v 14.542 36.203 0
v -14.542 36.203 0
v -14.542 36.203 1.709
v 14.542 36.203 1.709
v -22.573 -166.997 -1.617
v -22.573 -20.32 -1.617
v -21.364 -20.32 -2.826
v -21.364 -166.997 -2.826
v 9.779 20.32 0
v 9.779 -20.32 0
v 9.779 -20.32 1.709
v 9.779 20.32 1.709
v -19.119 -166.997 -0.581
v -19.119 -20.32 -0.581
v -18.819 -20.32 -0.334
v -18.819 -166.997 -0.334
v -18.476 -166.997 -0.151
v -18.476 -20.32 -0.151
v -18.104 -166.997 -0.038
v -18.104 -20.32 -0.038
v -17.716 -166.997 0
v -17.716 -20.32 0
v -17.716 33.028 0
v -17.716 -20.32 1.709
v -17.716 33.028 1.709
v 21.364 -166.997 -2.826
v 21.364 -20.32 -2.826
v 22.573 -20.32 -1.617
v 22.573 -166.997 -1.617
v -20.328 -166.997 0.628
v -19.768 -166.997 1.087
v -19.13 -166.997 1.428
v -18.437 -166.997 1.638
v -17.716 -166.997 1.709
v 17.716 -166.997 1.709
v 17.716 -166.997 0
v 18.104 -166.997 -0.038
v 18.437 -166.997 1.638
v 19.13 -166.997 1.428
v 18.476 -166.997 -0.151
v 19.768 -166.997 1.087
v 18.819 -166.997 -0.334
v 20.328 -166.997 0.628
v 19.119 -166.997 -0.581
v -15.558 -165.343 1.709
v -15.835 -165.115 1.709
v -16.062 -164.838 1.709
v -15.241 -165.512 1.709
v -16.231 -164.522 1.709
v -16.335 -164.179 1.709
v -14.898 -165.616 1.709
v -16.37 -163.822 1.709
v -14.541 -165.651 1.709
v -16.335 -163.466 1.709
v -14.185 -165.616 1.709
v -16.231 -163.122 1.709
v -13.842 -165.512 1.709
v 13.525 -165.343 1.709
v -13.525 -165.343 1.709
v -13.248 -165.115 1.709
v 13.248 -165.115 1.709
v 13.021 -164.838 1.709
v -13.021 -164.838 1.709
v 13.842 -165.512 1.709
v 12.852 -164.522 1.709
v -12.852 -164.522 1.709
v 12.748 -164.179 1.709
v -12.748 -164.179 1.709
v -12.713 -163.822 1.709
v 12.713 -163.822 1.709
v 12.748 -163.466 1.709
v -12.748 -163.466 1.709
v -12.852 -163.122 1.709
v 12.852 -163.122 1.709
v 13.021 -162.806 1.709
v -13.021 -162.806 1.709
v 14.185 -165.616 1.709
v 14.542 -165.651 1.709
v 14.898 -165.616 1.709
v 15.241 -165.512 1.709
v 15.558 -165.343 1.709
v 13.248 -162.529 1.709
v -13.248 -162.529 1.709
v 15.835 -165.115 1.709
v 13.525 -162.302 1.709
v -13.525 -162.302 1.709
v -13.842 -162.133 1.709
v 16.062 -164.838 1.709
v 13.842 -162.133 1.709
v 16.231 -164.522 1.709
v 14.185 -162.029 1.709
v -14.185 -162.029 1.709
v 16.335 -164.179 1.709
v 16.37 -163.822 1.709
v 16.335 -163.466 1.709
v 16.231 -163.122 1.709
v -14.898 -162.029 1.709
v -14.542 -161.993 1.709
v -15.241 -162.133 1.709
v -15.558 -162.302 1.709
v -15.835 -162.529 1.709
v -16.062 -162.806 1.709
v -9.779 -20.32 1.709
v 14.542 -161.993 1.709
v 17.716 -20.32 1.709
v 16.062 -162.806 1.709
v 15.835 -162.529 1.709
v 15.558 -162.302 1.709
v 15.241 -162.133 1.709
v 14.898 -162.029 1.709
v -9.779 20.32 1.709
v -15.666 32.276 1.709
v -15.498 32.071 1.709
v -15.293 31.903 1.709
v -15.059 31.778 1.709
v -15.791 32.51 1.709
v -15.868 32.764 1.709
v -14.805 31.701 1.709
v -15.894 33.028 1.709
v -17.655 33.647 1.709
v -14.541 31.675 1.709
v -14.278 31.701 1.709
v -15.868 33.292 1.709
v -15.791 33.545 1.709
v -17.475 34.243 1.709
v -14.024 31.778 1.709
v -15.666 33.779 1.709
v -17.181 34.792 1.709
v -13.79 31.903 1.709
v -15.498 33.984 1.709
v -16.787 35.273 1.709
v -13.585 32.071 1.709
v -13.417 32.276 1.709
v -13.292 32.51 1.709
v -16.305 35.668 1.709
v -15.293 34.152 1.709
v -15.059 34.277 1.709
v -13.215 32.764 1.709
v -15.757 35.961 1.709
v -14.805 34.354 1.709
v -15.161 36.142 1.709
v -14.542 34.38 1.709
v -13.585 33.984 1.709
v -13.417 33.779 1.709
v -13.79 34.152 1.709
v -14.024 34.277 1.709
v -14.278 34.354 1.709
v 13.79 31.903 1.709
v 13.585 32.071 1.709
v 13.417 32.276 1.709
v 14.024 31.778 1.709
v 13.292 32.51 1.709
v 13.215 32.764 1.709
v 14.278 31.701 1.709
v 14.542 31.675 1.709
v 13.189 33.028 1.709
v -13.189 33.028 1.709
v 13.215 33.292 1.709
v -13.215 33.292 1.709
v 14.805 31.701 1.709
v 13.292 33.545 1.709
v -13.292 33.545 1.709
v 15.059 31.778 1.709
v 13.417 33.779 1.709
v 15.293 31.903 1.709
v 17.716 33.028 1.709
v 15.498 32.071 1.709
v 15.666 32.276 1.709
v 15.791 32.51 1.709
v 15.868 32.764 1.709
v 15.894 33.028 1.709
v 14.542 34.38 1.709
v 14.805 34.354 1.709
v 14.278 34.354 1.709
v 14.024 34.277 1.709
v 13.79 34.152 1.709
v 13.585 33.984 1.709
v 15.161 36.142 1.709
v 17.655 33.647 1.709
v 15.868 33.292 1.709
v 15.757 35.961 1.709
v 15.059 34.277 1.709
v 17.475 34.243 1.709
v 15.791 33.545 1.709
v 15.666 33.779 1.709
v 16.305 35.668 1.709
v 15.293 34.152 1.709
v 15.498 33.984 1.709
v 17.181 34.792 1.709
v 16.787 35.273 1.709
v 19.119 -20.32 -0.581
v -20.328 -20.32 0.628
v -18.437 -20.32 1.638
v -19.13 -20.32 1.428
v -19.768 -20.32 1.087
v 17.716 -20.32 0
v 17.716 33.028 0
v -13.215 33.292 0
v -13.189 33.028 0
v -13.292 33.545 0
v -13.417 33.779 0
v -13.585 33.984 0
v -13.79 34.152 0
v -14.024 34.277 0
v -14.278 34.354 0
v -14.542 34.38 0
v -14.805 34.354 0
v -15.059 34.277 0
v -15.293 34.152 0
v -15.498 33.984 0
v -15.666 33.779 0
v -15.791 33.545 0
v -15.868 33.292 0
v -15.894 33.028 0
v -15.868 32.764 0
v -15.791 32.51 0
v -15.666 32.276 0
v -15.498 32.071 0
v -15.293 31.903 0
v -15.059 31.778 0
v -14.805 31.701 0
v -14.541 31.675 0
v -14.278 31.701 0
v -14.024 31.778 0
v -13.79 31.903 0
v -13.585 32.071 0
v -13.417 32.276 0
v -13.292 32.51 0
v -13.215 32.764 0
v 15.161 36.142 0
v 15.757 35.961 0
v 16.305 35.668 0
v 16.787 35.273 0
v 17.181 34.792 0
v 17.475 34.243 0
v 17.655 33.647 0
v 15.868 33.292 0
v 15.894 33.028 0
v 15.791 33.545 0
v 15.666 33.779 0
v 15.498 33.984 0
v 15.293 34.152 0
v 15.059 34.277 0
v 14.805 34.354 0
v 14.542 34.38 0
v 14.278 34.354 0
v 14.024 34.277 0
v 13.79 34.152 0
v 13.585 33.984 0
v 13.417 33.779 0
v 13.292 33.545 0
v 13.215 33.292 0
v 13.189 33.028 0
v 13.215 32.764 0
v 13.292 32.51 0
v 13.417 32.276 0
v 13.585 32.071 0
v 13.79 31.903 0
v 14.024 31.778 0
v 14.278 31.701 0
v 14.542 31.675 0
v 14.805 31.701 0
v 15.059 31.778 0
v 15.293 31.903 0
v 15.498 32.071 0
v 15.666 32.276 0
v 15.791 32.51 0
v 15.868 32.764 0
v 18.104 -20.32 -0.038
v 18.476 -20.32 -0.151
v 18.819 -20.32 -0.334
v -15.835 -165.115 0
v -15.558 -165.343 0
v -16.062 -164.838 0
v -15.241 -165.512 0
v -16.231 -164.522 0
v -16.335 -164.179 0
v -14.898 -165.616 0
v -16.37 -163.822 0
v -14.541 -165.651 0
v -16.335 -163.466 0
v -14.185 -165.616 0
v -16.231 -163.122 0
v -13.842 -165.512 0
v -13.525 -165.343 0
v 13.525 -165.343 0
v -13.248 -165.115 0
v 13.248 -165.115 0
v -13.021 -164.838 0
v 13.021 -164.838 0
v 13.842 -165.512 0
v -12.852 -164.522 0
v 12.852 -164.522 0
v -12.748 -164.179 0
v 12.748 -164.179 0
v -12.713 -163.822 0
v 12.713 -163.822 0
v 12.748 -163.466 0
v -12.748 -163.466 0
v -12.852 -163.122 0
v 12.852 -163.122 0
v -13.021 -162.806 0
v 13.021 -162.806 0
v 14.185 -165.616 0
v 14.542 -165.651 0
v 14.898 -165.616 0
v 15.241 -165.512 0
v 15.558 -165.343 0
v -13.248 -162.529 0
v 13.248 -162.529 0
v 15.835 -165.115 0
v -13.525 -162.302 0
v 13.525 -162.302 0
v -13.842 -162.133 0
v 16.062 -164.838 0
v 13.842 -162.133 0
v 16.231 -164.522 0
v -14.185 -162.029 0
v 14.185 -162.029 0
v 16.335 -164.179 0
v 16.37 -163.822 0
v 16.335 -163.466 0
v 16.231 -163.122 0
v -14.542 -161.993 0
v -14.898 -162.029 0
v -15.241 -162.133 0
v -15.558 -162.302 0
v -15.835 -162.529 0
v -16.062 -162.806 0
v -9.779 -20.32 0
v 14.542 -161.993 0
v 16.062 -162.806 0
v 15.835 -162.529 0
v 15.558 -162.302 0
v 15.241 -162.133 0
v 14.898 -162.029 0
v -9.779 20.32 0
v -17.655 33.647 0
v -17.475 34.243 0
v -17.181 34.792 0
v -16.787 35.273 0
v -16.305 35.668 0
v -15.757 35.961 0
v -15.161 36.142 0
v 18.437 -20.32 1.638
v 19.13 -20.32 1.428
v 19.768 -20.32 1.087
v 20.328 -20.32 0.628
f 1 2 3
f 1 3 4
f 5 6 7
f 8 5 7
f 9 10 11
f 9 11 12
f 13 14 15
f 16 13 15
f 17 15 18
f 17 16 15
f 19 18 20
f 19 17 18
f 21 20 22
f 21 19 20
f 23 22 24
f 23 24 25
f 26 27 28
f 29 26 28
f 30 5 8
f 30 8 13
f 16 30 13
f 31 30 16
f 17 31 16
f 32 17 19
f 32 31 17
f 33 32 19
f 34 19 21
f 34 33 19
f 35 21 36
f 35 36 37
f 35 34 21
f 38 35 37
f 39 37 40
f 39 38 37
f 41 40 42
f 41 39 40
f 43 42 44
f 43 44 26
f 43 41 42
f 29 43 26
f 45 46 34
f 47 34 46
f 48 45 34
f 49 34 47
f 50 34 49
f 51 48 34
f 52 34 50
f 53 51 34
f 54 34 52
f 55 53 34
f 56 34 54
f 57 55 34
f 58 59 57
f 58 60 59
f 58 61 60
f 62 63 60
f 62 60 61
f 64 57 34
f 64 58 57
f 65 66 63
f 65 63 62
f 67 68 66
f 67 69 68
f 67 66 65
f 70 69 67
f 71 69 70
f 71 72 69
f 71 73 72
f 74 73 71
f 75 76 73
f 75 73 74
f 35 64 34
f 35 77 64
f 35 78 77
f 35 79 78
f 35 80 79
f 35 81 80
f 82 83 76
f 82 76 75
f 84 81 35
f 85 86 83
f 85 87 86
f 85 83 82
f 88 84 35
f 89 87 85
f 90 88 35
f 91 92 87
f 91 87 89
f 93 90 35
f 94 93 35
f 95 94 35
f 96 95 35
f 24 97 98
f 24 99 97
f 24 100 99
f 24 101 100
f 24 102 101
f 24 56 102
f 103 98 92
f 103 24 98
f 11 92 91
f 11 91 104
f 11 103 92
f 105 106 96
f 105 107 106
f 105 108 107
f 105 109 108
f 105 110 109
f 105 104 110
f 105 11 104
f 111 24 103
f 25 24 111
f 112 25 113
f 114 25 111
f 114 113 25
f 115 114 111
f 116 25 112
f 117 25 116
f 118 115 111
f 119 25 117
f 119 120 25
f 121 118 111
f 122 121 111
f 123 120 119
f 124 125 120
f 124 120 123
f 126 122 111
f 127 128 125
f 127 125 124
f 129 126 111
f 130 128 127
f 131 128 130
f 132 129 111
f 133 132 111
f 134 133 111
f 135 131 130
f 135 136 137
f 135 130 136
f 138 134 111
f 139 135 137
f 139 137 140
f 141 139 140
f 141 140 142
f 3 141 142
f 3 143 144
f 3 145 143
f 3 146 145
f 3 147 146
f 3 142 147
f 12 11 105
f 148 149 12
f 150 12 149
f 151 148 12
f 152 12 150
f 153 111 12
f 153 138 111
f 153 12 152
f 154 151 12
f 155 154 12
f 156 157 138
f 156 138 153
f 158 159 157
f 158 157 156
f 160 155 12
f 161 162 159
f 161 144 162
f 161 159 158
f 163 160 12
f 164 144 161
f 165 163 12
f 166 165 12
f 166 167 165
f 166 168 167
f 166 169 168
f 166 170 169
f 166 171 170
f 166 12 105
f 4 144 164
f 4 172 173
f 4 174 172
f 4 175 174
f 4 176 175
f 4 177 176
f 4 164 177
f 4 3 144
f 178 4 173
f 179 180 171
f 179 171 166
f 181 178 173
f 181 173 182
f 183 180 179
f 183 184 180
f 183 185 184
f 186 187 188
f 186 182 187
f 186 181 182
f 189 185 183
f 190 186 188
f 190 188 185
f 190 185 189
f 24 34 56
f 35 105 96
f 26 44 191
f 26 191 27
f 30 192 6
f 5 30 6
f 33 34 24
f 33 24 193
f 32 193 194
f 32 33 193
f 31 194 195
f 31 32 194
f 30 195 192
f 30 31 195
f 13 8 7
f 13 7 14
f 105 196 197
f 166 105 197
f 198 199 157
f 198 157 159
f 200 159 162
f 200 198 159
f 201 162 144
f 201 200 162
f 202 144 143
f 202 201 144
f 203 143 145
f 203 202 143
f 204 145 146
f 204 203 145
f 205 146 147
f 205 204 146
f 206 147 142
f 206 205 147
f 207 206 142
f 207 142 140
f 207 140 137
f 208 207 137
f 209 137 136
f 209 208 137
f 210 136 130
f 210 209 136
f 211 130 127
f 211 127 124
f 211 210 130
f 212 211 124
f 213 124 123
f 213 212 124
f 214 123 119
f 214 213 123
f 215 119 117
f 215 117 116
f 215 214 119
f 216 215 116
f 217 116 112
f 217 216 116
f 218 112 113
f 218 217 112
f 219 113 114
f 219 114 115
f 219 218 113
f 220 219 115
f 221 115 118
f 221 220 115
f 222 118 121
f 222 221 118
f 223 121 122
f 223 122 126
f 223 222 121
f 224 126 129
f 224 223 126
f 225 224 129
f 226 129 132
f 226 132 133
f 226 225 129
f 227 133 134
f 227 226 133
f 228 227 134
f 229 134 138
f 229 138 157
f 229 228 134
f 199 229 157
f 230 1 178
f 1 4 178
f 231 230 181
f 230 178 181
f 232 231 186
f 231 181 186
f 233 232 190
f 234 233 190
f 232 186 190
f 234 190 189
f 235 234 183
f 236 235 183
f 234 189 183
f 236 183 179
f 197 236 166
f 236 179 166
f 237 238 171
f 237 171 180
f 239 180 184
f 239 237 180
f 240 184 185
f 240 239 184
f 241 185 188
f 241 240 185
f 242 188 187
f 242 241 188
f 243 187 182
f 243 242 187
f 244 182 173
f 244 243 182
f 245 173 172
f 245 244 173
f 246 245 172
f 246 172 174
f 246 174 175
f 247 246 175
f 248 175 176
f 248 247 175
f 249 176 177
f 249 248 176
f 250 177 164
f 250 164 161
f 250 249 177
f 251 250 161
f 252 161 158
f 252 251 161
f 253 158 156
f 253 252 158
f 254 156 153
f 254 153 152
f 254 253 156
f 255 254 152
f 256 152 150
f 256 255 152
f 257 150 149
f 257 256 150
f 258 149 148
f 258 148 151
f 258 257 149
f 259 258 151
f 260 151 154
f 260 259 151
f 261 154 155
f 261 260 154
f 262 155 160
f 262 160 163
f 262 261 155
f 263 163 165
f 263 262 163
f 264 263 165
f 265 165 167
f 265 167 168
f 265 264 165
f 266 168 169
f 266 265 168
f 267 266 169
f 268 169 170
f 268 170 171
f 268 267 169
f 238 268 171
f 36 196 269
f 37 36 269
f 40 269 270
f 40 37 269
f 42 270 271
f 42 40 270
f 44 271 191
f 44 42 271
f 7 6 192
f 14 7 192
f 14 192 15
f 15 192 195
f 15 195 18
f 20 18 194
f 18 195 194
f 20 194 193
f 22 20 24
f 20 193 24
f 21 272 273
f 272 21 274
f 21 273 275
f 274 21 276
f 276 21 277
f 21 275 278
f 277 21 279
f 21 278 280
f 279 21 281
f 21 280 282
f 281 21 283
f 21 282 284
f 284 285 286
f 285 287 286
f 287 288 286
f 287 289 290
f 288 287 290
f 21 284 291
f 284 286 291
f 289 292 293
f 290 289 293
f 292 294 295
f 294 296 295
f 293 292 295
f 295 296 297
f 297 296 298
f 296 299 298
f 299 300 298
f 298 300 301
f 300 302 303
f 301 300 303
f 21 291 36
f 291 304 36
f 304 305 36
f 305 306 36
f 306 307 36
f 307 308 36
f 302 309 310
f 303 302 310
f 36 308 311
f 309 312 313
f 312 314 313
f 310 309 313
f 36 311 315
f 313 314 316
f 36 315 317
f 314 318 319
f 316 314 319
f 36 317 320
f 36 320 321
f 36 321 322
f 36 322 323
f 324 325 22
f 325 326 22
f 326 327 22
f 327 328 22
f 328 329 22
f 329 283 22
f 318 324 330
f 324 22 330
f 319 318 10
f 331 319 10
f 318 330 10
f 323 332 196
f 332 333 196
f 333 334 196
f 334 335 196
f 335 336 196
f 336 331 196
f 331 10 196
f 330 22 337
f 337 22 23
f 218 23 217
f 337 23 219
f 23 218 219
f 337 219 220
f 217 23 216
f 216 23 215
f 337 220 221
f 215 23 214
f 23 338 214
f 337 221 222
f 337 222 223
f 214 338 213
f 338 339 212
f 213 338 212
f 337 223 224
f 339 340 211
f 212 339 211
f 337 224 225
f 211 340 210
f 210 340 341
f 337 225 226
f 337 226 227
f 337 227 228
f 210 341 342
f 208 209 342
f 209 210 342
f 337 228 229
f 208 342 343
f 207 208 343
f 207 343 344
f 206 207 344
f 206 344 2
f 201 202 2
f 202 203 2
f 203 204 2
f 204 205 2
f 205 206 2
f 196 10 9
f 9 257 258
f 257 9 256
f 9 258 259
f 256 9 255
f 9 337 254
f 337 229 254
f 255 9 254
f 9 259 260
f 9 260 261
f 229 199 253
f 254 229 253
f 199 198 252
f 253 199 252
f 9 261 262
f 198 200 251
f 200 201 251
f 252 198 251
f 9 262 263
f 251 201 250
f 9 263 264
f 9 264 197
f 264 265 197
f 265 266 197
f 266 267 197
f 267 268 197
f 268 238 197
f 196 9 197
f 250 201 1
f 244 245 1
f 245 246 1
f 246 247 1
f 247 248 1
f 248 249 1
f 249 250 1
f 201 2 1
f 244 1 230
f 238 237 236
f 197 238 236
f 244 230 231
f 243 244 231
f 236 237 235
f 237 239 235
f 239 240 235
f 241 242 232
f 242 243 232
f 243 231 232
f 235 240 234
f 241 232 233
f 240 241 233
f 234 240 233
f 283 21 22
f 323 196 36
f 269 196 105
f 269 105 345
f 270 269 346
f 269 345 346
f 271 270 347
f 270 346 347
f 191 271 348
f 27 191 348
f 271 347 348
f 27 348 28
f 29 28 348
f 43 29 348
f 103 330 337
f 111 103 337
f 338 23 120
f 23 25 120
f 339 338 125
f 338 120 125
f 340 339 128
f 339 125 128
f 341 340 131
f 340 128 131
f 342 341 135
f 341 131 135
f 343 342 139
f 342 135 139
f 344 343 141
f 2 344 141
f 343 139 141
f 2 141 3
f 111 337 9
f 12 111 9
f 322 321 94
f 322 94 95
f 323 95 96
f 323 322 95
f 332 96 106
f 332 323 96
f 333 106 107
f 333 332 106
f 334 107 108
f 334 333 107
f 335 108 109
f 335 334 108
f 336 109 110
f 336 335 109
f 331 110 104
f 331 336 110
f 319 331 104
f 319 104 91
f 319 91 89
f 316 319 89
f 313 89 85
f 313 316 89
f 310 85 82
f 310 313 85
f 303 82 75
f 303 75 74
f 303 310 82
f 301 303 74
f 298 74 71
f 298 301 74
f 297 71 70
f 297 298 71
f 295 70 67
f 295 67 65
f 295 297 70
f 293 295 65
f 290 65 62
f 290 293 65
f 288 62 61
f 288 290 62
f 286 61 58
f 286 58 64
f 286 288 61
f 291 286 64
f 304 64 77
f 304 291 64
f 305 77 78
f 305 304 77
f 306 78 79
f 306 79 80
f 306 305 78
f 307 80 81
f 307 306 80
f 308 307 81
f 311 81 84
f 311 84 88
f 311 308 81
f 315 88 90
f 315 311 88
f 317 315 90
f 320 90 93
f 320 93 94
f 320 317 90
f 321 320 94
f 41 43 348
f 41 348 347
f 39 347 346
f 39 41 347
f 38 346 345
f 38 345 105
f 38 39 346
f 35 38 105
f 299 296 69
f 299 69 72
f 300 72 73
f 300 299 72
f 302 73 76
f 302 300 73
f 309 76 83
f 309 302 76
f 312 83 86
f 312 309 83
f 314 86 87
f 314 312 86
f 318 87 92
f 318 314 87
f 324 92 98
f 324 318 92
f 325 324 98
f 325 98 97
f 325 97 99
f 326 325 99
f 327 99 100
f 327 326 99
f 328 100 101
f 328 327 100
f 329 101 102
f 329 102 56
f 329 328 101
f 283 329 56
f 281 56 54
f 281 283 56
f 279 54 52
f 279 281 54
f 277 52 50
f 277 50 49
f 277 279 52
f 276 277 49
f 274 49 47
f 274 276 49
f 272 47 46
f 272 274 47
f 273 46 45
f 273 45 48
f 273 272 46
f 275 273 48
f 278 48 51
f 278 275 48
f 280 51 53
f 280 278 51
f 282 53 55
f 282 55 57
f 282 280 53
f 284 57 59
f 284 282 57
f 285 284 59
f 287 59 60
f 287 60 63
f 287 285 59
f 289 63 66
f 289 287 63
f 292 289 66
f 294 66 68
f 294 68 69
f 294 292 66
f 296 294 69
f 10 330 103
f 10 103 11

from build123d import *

# Parameters (mm, degrees)
F0_W     = 35.433
F0_H     = 203.2
F0_R     = 1.8288
F0_R_2   = 1.35255
F0_W_2   = 19.558
F0_H_2   = 40.64
F1_DEPTH = 1.70942
F3_DEPTH = 146.677299
F4_R     = 3.175


with BuildPart() as f1:
    # F0 (on Top) → F1 (new body)
    with BuildSketch(Plane.XY):
        with Locations((0, -65.397299)):
            Rectangle(F0_W, F0_H)
        with Locations((-14.5415, -163.822299)):
            Circle(F0_R, mode=Mode.SUBTRACT)
        with Locations((14.5415, -163.822299)):
            Circle(F0_R, mode=Mode.SUBTRACT)
        with Locations((-14.5415, 33.027701)):
            Circle(F0_R_2, mode=Mode.SUBTRACT)
        Rectangle(F0_W_2, F0_H_2, mode=Mode.SUBTRACT)
        with Locations((14.5415, 33.027701)):
            Circle(F0_R_2, mode=Mode.SUBTRACT)
    extrude(amount=F1_DEPTH)

    # F2 (on face) → F3 (join, through all)
    with BuildSketch(Plane.XZ.offset(166.997299)):
        with BuildLine():
            ThreePointArc((-19.119216, -0.581024), (-18.475644, -0.151003), (-17.7165, 0))
            Line((-17.7165, 0), (-17.7165, 1.70942))
            ThreePointArc((-17.7165, 1.70942), (-19.129811, 1.428295), (-20.327958, 0.627718))
            Line((-20.327958, 0.627718), (-22.573023, -1.617346))
            Line((-22.573023, -1.617346), (-21.36428, -2.826088))
            Line((-21.36428, -2.826088), (-19.119216, -0.581024))
        make_face()
        with BuildLine():
            Line((17.7165, 1.70942), (17.7165, 0))
            ThreePointArc((17.7165, 0), (18.475644, -0.151003), (19.119216, -0.581024))
            Line((19.119216, -0.581024), (21.36428, -2.826088))
            Line((21.36428, -2.826088), (22.573023, -1.617346))
            Line((22.573023, -1.617346), (20.327958, 0.627718))
            ThreePointArc((20.327958, 0.627718), (19.129811, 1.428295), (17.7165, 1.70942))
        make_face()
    extrude(amount=-F3_DEPTH)

    # F4
    f4_edges = [f1.edges().sort_by_distance(p)[0] for p in [
        (17.7165, 36.202701, 0.85471),
        (-17.7165, 36.202701, 0.85471),
    ]]
    fillet(f4_edges, radius=F4_R)


solid = f1.part
